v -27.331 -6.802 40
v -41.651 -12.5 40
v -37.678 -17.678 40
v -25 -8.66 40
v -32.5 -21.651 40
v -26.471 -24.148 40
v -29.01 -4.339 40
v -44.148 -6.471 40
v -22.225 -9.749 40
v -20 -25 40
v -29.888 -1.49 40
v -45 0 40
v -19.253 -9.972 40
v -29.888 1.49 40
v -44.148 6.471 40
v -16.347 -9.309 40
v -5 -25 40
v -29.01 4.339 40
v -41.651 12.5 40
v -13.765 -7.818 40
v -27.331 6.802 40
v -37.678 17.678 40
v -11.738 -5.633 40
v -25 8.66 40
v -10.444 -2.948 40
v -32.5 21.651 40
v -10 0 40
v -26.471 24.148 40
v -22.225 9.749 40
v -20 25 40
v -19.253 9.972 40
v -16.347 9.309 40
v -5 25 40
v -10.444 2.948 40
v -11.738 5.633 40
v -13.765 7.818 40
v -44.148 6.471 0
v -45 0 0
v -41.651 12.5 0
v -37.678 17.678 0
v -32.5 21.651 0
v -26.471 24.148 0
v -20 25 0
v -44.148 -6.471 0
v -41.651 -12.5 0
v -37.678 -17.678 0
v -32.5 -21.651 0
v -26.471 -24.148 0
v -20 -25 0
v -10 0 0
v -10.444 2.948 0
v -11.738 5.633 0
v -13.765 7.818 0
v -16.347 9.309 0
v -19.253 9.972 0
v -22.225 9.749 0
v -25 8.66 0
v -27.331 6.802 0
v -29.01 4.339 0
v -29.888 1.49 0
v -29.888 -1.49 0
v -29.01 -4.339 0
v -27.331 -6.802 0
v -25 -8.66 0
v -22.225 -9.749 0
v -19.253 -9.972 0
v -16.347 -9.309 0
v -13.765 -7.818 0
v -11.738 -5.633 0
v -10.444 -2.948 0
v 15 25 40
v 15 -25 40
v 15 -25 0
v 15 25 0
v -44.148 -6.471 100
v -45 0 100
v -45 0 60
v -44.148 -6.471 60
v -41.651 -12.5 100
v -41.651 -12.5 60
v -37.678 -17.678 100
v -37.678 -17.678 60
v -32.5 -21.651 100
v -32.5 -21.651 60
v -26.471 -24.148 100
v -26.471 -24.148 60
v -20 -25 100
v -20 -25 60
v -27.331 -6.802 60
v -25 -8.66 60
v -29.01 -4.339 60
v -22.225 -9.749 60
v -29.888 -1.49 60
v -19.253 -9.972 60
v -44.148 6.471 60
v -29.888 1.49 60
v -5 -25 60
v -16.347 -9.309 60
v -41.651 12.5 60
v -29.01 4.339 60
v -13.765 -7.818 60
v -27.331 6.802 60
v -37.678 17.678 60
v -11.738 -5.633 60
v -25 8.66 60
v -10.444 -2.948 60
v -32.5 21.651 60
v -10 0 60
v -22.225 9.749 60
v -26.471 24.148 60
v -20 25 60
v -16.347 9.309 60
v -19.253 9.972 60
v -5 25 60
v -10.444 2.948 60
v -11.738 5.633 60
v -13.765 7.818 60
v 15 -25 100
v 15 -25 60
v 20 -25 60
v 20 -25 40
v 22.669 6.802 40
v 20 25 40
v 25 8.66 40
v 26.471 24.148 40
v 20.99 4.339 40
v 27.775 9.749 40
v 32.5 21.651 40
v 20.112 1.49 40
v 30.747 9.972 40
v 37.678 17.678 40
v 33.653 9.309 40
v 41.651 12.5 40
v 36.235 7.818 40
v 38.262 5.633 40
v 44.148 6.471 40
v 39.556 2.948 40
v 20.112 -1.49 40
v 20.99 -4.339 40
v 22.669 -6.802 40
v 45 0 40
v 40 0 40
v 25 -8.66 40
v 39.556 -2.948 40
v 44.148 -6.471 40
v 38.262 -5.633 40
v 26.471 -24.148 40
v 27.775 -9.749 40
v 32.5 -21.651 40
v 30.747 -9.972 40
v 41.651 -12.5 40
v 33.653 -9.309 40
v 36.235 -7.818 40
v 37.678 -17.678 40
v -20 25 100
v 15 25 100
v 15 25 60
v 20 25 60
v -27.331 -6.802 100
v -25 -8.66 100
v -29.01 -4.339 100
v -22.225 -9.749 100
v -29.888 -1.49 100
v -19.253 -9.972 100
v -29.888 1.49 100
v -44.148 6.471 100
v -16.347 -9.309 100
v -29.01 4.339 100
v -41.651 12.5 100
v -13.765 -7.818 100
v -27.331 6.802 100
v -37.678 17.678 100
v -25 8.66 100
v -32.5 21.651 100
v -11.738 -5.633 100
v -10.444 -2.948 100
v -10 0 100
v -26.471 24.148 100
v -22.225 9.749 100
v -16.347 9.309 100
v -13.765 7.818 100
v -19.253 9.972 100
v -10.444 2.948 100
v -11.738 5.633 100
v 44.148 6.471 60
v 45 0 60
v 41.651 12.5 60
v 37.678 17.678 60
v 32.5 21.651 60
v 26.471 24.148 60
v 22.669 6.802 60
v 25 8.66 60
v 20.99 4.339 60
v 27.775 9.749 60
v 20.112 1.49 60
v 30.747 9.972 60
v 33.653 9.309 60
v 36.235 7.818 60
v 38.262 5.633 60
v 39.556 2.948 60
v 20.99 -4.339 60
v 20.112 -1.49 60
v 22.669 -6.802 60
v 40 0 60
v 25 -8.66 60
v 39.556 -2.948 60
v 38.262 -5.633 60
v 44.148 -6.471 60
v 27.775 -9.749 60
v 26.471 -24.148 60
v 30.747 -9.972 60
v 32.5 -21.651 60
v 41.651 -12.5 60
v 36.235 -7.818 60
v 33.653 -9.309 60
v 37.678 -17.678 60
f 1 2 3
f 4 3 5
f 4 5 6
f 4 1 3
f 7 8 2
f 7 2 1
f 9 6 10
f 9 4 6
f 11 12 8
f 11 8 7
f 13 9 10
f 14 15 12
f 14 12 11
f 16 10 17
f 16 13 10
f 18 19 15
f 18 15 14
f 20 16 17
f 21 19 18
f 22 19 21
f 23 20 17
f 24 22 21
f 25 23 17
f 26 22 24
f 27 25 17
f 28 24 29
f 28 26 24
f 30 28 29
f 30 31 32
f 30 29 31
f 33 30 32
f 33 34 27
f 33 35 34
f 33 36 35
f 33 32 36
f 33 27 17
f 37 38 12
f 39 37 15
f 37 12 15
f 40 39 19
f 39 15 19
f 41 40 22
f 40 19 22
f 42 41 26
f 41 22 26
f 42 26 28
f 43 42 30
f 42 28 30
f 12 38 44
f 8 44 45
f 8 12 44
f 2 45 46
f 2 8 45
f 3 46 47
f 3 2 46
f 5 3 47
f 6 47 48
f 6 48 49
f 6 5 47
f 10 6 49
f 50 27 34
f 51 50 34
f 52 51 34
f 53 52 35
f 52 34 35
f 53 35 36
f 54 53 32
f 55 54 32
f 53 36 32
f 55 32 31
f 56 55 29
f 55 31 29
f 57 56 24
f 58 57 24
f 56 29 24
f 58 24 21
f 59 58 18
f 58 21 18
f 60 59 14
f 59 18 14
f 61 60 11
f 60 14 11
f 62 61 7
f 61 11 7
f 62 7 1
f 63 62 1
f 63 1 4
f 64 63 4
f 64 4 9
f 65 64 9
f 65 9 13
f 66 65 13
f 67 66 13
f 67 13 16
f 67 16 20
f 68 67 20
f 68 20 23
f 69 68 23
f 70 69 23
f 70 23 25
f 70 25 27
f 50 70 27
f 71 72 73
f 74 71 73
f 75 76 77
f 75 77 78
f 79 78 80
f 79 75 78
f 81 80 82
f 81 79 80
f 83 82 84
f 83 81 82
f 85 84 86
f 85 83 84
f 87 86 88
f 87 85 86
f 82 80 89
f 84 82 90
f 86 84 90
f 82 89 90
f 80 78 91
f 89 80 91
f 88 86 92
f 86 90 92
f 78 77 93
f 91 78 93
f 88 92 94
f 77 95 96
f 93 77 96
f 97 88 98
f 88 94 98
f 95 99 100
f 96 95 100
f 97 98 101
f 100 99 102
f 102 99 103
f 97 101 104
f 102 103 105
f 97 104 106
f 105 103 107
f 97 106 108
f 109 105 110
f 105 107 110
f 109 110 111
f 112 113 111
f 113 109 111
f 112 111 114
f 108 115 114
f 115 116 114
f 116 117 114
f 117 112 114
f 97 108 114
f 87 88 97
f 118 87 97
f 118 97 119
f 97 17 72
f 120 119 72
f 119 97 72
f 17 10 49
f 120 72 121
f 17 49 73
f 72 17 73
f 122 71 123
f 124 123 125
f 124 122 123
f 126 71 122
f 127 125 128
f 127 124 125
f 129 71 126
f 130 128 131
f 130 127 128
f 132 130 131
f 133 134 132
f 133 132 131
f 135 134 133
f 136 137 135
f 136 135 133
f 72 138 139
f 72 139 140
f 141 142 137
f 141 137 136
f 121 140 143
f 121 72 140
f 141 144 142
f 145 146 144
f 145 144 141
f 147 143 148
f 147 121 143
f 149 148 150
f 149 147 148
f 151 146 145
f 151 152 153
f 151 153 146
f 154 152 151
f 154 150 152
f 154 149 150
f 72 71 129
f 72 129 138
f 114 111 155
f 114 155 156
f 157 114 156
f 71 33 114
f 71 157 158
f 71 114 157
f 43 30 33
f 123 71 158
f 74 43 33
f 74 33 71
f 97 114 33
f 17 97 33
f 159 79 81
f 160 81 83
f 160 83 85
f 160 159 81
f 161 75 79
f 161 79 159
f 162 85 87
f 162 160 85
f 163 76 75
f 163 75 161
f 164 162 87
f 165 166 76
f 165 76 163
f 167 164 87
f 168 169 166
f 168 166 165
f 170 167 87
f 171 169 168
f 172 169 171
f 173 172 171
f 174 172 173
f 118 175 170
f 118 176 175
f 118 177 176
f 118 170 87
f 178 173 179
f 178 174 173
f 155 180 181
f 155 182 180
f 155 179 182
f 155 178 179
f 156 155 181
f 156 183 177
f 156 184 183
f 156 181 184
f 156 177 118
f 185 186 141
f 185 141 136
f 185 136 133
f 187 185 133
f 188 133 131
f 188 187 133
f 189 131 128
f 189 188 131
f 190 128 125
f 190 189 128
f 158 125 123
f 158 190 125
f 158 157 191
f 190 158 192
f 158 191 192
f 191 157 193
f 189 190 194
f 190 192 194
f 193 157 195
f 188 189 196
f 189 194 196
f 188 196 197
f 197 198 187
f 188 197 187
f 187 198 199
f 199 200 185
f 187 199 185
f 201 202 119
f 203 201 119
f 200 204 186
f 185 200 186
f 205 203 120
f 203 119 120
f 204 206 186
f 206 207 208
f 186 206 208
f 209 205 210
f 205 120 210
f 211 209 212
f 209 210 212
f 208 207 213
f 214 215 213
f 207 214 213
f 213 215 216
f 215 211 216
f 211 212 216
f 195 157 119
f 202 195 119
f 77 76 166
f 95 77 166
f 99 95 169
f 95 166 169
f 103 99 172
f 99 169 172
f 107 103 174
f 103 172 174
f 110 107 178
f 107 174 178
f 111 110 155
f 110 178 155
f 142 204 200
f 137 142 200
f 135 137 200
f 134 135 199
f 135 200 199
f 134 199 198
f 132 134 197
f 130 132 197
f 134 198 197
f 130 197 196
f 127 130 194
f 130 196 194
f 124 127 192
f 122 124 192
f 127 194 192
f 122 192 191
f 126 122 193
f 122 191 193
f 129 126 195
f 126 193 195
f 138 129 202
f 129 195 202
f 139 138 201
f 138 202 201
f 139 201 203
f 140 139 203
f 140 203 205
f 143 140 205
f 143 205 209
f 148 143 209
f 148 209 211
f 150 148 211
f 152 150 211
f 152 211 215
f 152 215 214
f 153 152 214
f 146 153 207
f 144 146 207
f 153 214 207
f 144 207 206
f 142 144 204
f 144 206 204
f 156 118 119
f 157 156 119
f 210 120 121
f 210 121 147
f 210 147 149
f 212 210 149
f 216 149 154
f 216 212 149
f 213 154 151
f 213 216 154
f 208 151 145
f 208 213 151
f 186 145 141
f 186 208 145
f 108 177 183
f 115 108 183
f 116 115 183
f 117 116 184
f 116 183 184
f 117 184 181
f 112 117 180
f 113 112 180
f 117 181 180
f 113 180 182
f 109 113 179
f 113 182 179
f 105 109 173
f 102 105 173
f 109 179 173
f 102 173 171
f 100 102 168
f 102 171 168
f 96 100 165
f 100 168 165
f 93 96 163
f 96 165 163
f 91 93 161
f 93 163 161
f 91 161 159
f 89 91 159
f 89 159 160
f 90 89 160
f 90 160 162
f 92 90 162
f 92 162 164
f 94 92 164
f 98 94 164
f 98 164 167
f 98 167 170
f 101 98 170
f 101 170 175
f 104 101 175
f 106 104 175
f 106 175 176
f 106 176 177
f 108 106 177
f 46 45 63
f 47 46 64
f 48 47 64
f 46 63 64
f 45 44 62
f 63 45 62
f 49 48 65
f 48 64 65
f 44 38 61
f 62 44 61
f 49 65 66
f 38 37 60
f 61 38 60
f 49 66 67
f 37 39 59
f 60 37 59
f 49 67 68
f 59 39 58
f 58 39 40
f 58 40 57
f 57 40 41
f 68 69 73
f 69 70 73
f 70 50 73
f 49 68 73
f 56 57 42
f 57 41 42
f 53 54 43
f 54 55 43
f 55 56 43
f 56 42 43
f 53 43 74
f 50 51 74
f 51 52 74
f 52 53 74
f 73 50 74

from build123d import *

# Parameters (mm, degrees)
CROQUIS1_W                 = 90
CROQUIS1_H                 = 50
SALIENTE_EXTRUIR1_DEPTH    = 100
REDONDEO1_R                = 25
CORTAR_EXTRUIR1_DEPTH      = 25
CORTAR_EXTRUIR1_DEPTH_BACK = 25
CROQUIS2_W                 = 30
CROQUIS2_H                 = 40
CROQUIS4_R                 = 10
CORTAR_EXTRUIR2_DEPTH      = 100
CROQUIS3_W                 = 40
CROQUIS3_H                 = 20
CORTAR_EXTRUIR3_DEPTH      = 50
CROQUIS5_R                 = 10
CORTAR_EXTRUIR4_DEPTH      = 20


with BuildPart() as part:
    # Croquis1 → Saliente-Extruir1 (new body)
    with BuildSketch(Plane.XY):
        Rectangle(CROQUIS1_W, CROQUIS1_H)
    extrude(amount=SALIENTE_EXTRUIR1_DEPTH)

    # Redondeo1
    redondeo1_edges = [part.edges().sort_by_distance(p)[0] for p in [
        (45, -25, 50),
        (45, 25, 50),
        (-45, -25, 50),
        (-45, 25, 50),
    ]]
    fillet(redondeo1_edges, radius=REDONDEO1_R - 0.0001)  # a hair under: the kernel refuses the full size

    # Croquis2 → Cortar-Extruir1 (cut, two sides: drawn at the far end of the back side and taken through both)
    with BuildSketch(Plane(origin=(0, 0, 0), x_dir=(1, 0, 0), z_dir=(0, 1, 0)).offset(-CORTAR_EXTRUIR1_DEPTH_BACK)):
        with Locations((30, -20)):
            Rectangle(CROQUIS2_W, CROQUIS2_H)
        with Locations((30, -80)):
            Rectangle(CROQUIS2_W, CROQUIS2_H)
    extrude(amount=CORTAR_EXTRUIR1_DEPTH + CORTAR_EXTRUIR1_DEPTH_BACK, mode=Mode.SUBTRACT)

    # Croquis4 → Cortar-Extruir2 (cut)
    with BuildSketch(Plane.XY.offset(100)):
        with Locations((-20, 0)):
            Circle(CROQUIS4_R)
    extrude(amount=-CORTAR_EXTRUIR2_DEPTH, mode=Mode.SUBTRACT)

    # Croquis3 → Cortar-Extruir3 (cut)
    with BuildSketch(Plane(origin=(0, 25, 0), x_dir=(1, 0, 0), z_dir=(0, 1, 0))):
        with Locations((-25, -50)):
            Rectangle(CROQUIS3_W, CROQUIS3_H)
    extrude(amount=-CORTAR_EXTRUIR3_DEPTH, mode=Mode.SUBTRACT)

    # Croquis5 → Cortar-Extruir4 (cut)
    with BuildSketch(Plane.XY.offset(60)):
        with Locations((30, 0)):
            Circle(CROQUIS5_R)
    extrude(amount=-CORTAR_EXTRUIR4_DEPTH, mode=Mode.SUBTRACT)


solid = part.part
